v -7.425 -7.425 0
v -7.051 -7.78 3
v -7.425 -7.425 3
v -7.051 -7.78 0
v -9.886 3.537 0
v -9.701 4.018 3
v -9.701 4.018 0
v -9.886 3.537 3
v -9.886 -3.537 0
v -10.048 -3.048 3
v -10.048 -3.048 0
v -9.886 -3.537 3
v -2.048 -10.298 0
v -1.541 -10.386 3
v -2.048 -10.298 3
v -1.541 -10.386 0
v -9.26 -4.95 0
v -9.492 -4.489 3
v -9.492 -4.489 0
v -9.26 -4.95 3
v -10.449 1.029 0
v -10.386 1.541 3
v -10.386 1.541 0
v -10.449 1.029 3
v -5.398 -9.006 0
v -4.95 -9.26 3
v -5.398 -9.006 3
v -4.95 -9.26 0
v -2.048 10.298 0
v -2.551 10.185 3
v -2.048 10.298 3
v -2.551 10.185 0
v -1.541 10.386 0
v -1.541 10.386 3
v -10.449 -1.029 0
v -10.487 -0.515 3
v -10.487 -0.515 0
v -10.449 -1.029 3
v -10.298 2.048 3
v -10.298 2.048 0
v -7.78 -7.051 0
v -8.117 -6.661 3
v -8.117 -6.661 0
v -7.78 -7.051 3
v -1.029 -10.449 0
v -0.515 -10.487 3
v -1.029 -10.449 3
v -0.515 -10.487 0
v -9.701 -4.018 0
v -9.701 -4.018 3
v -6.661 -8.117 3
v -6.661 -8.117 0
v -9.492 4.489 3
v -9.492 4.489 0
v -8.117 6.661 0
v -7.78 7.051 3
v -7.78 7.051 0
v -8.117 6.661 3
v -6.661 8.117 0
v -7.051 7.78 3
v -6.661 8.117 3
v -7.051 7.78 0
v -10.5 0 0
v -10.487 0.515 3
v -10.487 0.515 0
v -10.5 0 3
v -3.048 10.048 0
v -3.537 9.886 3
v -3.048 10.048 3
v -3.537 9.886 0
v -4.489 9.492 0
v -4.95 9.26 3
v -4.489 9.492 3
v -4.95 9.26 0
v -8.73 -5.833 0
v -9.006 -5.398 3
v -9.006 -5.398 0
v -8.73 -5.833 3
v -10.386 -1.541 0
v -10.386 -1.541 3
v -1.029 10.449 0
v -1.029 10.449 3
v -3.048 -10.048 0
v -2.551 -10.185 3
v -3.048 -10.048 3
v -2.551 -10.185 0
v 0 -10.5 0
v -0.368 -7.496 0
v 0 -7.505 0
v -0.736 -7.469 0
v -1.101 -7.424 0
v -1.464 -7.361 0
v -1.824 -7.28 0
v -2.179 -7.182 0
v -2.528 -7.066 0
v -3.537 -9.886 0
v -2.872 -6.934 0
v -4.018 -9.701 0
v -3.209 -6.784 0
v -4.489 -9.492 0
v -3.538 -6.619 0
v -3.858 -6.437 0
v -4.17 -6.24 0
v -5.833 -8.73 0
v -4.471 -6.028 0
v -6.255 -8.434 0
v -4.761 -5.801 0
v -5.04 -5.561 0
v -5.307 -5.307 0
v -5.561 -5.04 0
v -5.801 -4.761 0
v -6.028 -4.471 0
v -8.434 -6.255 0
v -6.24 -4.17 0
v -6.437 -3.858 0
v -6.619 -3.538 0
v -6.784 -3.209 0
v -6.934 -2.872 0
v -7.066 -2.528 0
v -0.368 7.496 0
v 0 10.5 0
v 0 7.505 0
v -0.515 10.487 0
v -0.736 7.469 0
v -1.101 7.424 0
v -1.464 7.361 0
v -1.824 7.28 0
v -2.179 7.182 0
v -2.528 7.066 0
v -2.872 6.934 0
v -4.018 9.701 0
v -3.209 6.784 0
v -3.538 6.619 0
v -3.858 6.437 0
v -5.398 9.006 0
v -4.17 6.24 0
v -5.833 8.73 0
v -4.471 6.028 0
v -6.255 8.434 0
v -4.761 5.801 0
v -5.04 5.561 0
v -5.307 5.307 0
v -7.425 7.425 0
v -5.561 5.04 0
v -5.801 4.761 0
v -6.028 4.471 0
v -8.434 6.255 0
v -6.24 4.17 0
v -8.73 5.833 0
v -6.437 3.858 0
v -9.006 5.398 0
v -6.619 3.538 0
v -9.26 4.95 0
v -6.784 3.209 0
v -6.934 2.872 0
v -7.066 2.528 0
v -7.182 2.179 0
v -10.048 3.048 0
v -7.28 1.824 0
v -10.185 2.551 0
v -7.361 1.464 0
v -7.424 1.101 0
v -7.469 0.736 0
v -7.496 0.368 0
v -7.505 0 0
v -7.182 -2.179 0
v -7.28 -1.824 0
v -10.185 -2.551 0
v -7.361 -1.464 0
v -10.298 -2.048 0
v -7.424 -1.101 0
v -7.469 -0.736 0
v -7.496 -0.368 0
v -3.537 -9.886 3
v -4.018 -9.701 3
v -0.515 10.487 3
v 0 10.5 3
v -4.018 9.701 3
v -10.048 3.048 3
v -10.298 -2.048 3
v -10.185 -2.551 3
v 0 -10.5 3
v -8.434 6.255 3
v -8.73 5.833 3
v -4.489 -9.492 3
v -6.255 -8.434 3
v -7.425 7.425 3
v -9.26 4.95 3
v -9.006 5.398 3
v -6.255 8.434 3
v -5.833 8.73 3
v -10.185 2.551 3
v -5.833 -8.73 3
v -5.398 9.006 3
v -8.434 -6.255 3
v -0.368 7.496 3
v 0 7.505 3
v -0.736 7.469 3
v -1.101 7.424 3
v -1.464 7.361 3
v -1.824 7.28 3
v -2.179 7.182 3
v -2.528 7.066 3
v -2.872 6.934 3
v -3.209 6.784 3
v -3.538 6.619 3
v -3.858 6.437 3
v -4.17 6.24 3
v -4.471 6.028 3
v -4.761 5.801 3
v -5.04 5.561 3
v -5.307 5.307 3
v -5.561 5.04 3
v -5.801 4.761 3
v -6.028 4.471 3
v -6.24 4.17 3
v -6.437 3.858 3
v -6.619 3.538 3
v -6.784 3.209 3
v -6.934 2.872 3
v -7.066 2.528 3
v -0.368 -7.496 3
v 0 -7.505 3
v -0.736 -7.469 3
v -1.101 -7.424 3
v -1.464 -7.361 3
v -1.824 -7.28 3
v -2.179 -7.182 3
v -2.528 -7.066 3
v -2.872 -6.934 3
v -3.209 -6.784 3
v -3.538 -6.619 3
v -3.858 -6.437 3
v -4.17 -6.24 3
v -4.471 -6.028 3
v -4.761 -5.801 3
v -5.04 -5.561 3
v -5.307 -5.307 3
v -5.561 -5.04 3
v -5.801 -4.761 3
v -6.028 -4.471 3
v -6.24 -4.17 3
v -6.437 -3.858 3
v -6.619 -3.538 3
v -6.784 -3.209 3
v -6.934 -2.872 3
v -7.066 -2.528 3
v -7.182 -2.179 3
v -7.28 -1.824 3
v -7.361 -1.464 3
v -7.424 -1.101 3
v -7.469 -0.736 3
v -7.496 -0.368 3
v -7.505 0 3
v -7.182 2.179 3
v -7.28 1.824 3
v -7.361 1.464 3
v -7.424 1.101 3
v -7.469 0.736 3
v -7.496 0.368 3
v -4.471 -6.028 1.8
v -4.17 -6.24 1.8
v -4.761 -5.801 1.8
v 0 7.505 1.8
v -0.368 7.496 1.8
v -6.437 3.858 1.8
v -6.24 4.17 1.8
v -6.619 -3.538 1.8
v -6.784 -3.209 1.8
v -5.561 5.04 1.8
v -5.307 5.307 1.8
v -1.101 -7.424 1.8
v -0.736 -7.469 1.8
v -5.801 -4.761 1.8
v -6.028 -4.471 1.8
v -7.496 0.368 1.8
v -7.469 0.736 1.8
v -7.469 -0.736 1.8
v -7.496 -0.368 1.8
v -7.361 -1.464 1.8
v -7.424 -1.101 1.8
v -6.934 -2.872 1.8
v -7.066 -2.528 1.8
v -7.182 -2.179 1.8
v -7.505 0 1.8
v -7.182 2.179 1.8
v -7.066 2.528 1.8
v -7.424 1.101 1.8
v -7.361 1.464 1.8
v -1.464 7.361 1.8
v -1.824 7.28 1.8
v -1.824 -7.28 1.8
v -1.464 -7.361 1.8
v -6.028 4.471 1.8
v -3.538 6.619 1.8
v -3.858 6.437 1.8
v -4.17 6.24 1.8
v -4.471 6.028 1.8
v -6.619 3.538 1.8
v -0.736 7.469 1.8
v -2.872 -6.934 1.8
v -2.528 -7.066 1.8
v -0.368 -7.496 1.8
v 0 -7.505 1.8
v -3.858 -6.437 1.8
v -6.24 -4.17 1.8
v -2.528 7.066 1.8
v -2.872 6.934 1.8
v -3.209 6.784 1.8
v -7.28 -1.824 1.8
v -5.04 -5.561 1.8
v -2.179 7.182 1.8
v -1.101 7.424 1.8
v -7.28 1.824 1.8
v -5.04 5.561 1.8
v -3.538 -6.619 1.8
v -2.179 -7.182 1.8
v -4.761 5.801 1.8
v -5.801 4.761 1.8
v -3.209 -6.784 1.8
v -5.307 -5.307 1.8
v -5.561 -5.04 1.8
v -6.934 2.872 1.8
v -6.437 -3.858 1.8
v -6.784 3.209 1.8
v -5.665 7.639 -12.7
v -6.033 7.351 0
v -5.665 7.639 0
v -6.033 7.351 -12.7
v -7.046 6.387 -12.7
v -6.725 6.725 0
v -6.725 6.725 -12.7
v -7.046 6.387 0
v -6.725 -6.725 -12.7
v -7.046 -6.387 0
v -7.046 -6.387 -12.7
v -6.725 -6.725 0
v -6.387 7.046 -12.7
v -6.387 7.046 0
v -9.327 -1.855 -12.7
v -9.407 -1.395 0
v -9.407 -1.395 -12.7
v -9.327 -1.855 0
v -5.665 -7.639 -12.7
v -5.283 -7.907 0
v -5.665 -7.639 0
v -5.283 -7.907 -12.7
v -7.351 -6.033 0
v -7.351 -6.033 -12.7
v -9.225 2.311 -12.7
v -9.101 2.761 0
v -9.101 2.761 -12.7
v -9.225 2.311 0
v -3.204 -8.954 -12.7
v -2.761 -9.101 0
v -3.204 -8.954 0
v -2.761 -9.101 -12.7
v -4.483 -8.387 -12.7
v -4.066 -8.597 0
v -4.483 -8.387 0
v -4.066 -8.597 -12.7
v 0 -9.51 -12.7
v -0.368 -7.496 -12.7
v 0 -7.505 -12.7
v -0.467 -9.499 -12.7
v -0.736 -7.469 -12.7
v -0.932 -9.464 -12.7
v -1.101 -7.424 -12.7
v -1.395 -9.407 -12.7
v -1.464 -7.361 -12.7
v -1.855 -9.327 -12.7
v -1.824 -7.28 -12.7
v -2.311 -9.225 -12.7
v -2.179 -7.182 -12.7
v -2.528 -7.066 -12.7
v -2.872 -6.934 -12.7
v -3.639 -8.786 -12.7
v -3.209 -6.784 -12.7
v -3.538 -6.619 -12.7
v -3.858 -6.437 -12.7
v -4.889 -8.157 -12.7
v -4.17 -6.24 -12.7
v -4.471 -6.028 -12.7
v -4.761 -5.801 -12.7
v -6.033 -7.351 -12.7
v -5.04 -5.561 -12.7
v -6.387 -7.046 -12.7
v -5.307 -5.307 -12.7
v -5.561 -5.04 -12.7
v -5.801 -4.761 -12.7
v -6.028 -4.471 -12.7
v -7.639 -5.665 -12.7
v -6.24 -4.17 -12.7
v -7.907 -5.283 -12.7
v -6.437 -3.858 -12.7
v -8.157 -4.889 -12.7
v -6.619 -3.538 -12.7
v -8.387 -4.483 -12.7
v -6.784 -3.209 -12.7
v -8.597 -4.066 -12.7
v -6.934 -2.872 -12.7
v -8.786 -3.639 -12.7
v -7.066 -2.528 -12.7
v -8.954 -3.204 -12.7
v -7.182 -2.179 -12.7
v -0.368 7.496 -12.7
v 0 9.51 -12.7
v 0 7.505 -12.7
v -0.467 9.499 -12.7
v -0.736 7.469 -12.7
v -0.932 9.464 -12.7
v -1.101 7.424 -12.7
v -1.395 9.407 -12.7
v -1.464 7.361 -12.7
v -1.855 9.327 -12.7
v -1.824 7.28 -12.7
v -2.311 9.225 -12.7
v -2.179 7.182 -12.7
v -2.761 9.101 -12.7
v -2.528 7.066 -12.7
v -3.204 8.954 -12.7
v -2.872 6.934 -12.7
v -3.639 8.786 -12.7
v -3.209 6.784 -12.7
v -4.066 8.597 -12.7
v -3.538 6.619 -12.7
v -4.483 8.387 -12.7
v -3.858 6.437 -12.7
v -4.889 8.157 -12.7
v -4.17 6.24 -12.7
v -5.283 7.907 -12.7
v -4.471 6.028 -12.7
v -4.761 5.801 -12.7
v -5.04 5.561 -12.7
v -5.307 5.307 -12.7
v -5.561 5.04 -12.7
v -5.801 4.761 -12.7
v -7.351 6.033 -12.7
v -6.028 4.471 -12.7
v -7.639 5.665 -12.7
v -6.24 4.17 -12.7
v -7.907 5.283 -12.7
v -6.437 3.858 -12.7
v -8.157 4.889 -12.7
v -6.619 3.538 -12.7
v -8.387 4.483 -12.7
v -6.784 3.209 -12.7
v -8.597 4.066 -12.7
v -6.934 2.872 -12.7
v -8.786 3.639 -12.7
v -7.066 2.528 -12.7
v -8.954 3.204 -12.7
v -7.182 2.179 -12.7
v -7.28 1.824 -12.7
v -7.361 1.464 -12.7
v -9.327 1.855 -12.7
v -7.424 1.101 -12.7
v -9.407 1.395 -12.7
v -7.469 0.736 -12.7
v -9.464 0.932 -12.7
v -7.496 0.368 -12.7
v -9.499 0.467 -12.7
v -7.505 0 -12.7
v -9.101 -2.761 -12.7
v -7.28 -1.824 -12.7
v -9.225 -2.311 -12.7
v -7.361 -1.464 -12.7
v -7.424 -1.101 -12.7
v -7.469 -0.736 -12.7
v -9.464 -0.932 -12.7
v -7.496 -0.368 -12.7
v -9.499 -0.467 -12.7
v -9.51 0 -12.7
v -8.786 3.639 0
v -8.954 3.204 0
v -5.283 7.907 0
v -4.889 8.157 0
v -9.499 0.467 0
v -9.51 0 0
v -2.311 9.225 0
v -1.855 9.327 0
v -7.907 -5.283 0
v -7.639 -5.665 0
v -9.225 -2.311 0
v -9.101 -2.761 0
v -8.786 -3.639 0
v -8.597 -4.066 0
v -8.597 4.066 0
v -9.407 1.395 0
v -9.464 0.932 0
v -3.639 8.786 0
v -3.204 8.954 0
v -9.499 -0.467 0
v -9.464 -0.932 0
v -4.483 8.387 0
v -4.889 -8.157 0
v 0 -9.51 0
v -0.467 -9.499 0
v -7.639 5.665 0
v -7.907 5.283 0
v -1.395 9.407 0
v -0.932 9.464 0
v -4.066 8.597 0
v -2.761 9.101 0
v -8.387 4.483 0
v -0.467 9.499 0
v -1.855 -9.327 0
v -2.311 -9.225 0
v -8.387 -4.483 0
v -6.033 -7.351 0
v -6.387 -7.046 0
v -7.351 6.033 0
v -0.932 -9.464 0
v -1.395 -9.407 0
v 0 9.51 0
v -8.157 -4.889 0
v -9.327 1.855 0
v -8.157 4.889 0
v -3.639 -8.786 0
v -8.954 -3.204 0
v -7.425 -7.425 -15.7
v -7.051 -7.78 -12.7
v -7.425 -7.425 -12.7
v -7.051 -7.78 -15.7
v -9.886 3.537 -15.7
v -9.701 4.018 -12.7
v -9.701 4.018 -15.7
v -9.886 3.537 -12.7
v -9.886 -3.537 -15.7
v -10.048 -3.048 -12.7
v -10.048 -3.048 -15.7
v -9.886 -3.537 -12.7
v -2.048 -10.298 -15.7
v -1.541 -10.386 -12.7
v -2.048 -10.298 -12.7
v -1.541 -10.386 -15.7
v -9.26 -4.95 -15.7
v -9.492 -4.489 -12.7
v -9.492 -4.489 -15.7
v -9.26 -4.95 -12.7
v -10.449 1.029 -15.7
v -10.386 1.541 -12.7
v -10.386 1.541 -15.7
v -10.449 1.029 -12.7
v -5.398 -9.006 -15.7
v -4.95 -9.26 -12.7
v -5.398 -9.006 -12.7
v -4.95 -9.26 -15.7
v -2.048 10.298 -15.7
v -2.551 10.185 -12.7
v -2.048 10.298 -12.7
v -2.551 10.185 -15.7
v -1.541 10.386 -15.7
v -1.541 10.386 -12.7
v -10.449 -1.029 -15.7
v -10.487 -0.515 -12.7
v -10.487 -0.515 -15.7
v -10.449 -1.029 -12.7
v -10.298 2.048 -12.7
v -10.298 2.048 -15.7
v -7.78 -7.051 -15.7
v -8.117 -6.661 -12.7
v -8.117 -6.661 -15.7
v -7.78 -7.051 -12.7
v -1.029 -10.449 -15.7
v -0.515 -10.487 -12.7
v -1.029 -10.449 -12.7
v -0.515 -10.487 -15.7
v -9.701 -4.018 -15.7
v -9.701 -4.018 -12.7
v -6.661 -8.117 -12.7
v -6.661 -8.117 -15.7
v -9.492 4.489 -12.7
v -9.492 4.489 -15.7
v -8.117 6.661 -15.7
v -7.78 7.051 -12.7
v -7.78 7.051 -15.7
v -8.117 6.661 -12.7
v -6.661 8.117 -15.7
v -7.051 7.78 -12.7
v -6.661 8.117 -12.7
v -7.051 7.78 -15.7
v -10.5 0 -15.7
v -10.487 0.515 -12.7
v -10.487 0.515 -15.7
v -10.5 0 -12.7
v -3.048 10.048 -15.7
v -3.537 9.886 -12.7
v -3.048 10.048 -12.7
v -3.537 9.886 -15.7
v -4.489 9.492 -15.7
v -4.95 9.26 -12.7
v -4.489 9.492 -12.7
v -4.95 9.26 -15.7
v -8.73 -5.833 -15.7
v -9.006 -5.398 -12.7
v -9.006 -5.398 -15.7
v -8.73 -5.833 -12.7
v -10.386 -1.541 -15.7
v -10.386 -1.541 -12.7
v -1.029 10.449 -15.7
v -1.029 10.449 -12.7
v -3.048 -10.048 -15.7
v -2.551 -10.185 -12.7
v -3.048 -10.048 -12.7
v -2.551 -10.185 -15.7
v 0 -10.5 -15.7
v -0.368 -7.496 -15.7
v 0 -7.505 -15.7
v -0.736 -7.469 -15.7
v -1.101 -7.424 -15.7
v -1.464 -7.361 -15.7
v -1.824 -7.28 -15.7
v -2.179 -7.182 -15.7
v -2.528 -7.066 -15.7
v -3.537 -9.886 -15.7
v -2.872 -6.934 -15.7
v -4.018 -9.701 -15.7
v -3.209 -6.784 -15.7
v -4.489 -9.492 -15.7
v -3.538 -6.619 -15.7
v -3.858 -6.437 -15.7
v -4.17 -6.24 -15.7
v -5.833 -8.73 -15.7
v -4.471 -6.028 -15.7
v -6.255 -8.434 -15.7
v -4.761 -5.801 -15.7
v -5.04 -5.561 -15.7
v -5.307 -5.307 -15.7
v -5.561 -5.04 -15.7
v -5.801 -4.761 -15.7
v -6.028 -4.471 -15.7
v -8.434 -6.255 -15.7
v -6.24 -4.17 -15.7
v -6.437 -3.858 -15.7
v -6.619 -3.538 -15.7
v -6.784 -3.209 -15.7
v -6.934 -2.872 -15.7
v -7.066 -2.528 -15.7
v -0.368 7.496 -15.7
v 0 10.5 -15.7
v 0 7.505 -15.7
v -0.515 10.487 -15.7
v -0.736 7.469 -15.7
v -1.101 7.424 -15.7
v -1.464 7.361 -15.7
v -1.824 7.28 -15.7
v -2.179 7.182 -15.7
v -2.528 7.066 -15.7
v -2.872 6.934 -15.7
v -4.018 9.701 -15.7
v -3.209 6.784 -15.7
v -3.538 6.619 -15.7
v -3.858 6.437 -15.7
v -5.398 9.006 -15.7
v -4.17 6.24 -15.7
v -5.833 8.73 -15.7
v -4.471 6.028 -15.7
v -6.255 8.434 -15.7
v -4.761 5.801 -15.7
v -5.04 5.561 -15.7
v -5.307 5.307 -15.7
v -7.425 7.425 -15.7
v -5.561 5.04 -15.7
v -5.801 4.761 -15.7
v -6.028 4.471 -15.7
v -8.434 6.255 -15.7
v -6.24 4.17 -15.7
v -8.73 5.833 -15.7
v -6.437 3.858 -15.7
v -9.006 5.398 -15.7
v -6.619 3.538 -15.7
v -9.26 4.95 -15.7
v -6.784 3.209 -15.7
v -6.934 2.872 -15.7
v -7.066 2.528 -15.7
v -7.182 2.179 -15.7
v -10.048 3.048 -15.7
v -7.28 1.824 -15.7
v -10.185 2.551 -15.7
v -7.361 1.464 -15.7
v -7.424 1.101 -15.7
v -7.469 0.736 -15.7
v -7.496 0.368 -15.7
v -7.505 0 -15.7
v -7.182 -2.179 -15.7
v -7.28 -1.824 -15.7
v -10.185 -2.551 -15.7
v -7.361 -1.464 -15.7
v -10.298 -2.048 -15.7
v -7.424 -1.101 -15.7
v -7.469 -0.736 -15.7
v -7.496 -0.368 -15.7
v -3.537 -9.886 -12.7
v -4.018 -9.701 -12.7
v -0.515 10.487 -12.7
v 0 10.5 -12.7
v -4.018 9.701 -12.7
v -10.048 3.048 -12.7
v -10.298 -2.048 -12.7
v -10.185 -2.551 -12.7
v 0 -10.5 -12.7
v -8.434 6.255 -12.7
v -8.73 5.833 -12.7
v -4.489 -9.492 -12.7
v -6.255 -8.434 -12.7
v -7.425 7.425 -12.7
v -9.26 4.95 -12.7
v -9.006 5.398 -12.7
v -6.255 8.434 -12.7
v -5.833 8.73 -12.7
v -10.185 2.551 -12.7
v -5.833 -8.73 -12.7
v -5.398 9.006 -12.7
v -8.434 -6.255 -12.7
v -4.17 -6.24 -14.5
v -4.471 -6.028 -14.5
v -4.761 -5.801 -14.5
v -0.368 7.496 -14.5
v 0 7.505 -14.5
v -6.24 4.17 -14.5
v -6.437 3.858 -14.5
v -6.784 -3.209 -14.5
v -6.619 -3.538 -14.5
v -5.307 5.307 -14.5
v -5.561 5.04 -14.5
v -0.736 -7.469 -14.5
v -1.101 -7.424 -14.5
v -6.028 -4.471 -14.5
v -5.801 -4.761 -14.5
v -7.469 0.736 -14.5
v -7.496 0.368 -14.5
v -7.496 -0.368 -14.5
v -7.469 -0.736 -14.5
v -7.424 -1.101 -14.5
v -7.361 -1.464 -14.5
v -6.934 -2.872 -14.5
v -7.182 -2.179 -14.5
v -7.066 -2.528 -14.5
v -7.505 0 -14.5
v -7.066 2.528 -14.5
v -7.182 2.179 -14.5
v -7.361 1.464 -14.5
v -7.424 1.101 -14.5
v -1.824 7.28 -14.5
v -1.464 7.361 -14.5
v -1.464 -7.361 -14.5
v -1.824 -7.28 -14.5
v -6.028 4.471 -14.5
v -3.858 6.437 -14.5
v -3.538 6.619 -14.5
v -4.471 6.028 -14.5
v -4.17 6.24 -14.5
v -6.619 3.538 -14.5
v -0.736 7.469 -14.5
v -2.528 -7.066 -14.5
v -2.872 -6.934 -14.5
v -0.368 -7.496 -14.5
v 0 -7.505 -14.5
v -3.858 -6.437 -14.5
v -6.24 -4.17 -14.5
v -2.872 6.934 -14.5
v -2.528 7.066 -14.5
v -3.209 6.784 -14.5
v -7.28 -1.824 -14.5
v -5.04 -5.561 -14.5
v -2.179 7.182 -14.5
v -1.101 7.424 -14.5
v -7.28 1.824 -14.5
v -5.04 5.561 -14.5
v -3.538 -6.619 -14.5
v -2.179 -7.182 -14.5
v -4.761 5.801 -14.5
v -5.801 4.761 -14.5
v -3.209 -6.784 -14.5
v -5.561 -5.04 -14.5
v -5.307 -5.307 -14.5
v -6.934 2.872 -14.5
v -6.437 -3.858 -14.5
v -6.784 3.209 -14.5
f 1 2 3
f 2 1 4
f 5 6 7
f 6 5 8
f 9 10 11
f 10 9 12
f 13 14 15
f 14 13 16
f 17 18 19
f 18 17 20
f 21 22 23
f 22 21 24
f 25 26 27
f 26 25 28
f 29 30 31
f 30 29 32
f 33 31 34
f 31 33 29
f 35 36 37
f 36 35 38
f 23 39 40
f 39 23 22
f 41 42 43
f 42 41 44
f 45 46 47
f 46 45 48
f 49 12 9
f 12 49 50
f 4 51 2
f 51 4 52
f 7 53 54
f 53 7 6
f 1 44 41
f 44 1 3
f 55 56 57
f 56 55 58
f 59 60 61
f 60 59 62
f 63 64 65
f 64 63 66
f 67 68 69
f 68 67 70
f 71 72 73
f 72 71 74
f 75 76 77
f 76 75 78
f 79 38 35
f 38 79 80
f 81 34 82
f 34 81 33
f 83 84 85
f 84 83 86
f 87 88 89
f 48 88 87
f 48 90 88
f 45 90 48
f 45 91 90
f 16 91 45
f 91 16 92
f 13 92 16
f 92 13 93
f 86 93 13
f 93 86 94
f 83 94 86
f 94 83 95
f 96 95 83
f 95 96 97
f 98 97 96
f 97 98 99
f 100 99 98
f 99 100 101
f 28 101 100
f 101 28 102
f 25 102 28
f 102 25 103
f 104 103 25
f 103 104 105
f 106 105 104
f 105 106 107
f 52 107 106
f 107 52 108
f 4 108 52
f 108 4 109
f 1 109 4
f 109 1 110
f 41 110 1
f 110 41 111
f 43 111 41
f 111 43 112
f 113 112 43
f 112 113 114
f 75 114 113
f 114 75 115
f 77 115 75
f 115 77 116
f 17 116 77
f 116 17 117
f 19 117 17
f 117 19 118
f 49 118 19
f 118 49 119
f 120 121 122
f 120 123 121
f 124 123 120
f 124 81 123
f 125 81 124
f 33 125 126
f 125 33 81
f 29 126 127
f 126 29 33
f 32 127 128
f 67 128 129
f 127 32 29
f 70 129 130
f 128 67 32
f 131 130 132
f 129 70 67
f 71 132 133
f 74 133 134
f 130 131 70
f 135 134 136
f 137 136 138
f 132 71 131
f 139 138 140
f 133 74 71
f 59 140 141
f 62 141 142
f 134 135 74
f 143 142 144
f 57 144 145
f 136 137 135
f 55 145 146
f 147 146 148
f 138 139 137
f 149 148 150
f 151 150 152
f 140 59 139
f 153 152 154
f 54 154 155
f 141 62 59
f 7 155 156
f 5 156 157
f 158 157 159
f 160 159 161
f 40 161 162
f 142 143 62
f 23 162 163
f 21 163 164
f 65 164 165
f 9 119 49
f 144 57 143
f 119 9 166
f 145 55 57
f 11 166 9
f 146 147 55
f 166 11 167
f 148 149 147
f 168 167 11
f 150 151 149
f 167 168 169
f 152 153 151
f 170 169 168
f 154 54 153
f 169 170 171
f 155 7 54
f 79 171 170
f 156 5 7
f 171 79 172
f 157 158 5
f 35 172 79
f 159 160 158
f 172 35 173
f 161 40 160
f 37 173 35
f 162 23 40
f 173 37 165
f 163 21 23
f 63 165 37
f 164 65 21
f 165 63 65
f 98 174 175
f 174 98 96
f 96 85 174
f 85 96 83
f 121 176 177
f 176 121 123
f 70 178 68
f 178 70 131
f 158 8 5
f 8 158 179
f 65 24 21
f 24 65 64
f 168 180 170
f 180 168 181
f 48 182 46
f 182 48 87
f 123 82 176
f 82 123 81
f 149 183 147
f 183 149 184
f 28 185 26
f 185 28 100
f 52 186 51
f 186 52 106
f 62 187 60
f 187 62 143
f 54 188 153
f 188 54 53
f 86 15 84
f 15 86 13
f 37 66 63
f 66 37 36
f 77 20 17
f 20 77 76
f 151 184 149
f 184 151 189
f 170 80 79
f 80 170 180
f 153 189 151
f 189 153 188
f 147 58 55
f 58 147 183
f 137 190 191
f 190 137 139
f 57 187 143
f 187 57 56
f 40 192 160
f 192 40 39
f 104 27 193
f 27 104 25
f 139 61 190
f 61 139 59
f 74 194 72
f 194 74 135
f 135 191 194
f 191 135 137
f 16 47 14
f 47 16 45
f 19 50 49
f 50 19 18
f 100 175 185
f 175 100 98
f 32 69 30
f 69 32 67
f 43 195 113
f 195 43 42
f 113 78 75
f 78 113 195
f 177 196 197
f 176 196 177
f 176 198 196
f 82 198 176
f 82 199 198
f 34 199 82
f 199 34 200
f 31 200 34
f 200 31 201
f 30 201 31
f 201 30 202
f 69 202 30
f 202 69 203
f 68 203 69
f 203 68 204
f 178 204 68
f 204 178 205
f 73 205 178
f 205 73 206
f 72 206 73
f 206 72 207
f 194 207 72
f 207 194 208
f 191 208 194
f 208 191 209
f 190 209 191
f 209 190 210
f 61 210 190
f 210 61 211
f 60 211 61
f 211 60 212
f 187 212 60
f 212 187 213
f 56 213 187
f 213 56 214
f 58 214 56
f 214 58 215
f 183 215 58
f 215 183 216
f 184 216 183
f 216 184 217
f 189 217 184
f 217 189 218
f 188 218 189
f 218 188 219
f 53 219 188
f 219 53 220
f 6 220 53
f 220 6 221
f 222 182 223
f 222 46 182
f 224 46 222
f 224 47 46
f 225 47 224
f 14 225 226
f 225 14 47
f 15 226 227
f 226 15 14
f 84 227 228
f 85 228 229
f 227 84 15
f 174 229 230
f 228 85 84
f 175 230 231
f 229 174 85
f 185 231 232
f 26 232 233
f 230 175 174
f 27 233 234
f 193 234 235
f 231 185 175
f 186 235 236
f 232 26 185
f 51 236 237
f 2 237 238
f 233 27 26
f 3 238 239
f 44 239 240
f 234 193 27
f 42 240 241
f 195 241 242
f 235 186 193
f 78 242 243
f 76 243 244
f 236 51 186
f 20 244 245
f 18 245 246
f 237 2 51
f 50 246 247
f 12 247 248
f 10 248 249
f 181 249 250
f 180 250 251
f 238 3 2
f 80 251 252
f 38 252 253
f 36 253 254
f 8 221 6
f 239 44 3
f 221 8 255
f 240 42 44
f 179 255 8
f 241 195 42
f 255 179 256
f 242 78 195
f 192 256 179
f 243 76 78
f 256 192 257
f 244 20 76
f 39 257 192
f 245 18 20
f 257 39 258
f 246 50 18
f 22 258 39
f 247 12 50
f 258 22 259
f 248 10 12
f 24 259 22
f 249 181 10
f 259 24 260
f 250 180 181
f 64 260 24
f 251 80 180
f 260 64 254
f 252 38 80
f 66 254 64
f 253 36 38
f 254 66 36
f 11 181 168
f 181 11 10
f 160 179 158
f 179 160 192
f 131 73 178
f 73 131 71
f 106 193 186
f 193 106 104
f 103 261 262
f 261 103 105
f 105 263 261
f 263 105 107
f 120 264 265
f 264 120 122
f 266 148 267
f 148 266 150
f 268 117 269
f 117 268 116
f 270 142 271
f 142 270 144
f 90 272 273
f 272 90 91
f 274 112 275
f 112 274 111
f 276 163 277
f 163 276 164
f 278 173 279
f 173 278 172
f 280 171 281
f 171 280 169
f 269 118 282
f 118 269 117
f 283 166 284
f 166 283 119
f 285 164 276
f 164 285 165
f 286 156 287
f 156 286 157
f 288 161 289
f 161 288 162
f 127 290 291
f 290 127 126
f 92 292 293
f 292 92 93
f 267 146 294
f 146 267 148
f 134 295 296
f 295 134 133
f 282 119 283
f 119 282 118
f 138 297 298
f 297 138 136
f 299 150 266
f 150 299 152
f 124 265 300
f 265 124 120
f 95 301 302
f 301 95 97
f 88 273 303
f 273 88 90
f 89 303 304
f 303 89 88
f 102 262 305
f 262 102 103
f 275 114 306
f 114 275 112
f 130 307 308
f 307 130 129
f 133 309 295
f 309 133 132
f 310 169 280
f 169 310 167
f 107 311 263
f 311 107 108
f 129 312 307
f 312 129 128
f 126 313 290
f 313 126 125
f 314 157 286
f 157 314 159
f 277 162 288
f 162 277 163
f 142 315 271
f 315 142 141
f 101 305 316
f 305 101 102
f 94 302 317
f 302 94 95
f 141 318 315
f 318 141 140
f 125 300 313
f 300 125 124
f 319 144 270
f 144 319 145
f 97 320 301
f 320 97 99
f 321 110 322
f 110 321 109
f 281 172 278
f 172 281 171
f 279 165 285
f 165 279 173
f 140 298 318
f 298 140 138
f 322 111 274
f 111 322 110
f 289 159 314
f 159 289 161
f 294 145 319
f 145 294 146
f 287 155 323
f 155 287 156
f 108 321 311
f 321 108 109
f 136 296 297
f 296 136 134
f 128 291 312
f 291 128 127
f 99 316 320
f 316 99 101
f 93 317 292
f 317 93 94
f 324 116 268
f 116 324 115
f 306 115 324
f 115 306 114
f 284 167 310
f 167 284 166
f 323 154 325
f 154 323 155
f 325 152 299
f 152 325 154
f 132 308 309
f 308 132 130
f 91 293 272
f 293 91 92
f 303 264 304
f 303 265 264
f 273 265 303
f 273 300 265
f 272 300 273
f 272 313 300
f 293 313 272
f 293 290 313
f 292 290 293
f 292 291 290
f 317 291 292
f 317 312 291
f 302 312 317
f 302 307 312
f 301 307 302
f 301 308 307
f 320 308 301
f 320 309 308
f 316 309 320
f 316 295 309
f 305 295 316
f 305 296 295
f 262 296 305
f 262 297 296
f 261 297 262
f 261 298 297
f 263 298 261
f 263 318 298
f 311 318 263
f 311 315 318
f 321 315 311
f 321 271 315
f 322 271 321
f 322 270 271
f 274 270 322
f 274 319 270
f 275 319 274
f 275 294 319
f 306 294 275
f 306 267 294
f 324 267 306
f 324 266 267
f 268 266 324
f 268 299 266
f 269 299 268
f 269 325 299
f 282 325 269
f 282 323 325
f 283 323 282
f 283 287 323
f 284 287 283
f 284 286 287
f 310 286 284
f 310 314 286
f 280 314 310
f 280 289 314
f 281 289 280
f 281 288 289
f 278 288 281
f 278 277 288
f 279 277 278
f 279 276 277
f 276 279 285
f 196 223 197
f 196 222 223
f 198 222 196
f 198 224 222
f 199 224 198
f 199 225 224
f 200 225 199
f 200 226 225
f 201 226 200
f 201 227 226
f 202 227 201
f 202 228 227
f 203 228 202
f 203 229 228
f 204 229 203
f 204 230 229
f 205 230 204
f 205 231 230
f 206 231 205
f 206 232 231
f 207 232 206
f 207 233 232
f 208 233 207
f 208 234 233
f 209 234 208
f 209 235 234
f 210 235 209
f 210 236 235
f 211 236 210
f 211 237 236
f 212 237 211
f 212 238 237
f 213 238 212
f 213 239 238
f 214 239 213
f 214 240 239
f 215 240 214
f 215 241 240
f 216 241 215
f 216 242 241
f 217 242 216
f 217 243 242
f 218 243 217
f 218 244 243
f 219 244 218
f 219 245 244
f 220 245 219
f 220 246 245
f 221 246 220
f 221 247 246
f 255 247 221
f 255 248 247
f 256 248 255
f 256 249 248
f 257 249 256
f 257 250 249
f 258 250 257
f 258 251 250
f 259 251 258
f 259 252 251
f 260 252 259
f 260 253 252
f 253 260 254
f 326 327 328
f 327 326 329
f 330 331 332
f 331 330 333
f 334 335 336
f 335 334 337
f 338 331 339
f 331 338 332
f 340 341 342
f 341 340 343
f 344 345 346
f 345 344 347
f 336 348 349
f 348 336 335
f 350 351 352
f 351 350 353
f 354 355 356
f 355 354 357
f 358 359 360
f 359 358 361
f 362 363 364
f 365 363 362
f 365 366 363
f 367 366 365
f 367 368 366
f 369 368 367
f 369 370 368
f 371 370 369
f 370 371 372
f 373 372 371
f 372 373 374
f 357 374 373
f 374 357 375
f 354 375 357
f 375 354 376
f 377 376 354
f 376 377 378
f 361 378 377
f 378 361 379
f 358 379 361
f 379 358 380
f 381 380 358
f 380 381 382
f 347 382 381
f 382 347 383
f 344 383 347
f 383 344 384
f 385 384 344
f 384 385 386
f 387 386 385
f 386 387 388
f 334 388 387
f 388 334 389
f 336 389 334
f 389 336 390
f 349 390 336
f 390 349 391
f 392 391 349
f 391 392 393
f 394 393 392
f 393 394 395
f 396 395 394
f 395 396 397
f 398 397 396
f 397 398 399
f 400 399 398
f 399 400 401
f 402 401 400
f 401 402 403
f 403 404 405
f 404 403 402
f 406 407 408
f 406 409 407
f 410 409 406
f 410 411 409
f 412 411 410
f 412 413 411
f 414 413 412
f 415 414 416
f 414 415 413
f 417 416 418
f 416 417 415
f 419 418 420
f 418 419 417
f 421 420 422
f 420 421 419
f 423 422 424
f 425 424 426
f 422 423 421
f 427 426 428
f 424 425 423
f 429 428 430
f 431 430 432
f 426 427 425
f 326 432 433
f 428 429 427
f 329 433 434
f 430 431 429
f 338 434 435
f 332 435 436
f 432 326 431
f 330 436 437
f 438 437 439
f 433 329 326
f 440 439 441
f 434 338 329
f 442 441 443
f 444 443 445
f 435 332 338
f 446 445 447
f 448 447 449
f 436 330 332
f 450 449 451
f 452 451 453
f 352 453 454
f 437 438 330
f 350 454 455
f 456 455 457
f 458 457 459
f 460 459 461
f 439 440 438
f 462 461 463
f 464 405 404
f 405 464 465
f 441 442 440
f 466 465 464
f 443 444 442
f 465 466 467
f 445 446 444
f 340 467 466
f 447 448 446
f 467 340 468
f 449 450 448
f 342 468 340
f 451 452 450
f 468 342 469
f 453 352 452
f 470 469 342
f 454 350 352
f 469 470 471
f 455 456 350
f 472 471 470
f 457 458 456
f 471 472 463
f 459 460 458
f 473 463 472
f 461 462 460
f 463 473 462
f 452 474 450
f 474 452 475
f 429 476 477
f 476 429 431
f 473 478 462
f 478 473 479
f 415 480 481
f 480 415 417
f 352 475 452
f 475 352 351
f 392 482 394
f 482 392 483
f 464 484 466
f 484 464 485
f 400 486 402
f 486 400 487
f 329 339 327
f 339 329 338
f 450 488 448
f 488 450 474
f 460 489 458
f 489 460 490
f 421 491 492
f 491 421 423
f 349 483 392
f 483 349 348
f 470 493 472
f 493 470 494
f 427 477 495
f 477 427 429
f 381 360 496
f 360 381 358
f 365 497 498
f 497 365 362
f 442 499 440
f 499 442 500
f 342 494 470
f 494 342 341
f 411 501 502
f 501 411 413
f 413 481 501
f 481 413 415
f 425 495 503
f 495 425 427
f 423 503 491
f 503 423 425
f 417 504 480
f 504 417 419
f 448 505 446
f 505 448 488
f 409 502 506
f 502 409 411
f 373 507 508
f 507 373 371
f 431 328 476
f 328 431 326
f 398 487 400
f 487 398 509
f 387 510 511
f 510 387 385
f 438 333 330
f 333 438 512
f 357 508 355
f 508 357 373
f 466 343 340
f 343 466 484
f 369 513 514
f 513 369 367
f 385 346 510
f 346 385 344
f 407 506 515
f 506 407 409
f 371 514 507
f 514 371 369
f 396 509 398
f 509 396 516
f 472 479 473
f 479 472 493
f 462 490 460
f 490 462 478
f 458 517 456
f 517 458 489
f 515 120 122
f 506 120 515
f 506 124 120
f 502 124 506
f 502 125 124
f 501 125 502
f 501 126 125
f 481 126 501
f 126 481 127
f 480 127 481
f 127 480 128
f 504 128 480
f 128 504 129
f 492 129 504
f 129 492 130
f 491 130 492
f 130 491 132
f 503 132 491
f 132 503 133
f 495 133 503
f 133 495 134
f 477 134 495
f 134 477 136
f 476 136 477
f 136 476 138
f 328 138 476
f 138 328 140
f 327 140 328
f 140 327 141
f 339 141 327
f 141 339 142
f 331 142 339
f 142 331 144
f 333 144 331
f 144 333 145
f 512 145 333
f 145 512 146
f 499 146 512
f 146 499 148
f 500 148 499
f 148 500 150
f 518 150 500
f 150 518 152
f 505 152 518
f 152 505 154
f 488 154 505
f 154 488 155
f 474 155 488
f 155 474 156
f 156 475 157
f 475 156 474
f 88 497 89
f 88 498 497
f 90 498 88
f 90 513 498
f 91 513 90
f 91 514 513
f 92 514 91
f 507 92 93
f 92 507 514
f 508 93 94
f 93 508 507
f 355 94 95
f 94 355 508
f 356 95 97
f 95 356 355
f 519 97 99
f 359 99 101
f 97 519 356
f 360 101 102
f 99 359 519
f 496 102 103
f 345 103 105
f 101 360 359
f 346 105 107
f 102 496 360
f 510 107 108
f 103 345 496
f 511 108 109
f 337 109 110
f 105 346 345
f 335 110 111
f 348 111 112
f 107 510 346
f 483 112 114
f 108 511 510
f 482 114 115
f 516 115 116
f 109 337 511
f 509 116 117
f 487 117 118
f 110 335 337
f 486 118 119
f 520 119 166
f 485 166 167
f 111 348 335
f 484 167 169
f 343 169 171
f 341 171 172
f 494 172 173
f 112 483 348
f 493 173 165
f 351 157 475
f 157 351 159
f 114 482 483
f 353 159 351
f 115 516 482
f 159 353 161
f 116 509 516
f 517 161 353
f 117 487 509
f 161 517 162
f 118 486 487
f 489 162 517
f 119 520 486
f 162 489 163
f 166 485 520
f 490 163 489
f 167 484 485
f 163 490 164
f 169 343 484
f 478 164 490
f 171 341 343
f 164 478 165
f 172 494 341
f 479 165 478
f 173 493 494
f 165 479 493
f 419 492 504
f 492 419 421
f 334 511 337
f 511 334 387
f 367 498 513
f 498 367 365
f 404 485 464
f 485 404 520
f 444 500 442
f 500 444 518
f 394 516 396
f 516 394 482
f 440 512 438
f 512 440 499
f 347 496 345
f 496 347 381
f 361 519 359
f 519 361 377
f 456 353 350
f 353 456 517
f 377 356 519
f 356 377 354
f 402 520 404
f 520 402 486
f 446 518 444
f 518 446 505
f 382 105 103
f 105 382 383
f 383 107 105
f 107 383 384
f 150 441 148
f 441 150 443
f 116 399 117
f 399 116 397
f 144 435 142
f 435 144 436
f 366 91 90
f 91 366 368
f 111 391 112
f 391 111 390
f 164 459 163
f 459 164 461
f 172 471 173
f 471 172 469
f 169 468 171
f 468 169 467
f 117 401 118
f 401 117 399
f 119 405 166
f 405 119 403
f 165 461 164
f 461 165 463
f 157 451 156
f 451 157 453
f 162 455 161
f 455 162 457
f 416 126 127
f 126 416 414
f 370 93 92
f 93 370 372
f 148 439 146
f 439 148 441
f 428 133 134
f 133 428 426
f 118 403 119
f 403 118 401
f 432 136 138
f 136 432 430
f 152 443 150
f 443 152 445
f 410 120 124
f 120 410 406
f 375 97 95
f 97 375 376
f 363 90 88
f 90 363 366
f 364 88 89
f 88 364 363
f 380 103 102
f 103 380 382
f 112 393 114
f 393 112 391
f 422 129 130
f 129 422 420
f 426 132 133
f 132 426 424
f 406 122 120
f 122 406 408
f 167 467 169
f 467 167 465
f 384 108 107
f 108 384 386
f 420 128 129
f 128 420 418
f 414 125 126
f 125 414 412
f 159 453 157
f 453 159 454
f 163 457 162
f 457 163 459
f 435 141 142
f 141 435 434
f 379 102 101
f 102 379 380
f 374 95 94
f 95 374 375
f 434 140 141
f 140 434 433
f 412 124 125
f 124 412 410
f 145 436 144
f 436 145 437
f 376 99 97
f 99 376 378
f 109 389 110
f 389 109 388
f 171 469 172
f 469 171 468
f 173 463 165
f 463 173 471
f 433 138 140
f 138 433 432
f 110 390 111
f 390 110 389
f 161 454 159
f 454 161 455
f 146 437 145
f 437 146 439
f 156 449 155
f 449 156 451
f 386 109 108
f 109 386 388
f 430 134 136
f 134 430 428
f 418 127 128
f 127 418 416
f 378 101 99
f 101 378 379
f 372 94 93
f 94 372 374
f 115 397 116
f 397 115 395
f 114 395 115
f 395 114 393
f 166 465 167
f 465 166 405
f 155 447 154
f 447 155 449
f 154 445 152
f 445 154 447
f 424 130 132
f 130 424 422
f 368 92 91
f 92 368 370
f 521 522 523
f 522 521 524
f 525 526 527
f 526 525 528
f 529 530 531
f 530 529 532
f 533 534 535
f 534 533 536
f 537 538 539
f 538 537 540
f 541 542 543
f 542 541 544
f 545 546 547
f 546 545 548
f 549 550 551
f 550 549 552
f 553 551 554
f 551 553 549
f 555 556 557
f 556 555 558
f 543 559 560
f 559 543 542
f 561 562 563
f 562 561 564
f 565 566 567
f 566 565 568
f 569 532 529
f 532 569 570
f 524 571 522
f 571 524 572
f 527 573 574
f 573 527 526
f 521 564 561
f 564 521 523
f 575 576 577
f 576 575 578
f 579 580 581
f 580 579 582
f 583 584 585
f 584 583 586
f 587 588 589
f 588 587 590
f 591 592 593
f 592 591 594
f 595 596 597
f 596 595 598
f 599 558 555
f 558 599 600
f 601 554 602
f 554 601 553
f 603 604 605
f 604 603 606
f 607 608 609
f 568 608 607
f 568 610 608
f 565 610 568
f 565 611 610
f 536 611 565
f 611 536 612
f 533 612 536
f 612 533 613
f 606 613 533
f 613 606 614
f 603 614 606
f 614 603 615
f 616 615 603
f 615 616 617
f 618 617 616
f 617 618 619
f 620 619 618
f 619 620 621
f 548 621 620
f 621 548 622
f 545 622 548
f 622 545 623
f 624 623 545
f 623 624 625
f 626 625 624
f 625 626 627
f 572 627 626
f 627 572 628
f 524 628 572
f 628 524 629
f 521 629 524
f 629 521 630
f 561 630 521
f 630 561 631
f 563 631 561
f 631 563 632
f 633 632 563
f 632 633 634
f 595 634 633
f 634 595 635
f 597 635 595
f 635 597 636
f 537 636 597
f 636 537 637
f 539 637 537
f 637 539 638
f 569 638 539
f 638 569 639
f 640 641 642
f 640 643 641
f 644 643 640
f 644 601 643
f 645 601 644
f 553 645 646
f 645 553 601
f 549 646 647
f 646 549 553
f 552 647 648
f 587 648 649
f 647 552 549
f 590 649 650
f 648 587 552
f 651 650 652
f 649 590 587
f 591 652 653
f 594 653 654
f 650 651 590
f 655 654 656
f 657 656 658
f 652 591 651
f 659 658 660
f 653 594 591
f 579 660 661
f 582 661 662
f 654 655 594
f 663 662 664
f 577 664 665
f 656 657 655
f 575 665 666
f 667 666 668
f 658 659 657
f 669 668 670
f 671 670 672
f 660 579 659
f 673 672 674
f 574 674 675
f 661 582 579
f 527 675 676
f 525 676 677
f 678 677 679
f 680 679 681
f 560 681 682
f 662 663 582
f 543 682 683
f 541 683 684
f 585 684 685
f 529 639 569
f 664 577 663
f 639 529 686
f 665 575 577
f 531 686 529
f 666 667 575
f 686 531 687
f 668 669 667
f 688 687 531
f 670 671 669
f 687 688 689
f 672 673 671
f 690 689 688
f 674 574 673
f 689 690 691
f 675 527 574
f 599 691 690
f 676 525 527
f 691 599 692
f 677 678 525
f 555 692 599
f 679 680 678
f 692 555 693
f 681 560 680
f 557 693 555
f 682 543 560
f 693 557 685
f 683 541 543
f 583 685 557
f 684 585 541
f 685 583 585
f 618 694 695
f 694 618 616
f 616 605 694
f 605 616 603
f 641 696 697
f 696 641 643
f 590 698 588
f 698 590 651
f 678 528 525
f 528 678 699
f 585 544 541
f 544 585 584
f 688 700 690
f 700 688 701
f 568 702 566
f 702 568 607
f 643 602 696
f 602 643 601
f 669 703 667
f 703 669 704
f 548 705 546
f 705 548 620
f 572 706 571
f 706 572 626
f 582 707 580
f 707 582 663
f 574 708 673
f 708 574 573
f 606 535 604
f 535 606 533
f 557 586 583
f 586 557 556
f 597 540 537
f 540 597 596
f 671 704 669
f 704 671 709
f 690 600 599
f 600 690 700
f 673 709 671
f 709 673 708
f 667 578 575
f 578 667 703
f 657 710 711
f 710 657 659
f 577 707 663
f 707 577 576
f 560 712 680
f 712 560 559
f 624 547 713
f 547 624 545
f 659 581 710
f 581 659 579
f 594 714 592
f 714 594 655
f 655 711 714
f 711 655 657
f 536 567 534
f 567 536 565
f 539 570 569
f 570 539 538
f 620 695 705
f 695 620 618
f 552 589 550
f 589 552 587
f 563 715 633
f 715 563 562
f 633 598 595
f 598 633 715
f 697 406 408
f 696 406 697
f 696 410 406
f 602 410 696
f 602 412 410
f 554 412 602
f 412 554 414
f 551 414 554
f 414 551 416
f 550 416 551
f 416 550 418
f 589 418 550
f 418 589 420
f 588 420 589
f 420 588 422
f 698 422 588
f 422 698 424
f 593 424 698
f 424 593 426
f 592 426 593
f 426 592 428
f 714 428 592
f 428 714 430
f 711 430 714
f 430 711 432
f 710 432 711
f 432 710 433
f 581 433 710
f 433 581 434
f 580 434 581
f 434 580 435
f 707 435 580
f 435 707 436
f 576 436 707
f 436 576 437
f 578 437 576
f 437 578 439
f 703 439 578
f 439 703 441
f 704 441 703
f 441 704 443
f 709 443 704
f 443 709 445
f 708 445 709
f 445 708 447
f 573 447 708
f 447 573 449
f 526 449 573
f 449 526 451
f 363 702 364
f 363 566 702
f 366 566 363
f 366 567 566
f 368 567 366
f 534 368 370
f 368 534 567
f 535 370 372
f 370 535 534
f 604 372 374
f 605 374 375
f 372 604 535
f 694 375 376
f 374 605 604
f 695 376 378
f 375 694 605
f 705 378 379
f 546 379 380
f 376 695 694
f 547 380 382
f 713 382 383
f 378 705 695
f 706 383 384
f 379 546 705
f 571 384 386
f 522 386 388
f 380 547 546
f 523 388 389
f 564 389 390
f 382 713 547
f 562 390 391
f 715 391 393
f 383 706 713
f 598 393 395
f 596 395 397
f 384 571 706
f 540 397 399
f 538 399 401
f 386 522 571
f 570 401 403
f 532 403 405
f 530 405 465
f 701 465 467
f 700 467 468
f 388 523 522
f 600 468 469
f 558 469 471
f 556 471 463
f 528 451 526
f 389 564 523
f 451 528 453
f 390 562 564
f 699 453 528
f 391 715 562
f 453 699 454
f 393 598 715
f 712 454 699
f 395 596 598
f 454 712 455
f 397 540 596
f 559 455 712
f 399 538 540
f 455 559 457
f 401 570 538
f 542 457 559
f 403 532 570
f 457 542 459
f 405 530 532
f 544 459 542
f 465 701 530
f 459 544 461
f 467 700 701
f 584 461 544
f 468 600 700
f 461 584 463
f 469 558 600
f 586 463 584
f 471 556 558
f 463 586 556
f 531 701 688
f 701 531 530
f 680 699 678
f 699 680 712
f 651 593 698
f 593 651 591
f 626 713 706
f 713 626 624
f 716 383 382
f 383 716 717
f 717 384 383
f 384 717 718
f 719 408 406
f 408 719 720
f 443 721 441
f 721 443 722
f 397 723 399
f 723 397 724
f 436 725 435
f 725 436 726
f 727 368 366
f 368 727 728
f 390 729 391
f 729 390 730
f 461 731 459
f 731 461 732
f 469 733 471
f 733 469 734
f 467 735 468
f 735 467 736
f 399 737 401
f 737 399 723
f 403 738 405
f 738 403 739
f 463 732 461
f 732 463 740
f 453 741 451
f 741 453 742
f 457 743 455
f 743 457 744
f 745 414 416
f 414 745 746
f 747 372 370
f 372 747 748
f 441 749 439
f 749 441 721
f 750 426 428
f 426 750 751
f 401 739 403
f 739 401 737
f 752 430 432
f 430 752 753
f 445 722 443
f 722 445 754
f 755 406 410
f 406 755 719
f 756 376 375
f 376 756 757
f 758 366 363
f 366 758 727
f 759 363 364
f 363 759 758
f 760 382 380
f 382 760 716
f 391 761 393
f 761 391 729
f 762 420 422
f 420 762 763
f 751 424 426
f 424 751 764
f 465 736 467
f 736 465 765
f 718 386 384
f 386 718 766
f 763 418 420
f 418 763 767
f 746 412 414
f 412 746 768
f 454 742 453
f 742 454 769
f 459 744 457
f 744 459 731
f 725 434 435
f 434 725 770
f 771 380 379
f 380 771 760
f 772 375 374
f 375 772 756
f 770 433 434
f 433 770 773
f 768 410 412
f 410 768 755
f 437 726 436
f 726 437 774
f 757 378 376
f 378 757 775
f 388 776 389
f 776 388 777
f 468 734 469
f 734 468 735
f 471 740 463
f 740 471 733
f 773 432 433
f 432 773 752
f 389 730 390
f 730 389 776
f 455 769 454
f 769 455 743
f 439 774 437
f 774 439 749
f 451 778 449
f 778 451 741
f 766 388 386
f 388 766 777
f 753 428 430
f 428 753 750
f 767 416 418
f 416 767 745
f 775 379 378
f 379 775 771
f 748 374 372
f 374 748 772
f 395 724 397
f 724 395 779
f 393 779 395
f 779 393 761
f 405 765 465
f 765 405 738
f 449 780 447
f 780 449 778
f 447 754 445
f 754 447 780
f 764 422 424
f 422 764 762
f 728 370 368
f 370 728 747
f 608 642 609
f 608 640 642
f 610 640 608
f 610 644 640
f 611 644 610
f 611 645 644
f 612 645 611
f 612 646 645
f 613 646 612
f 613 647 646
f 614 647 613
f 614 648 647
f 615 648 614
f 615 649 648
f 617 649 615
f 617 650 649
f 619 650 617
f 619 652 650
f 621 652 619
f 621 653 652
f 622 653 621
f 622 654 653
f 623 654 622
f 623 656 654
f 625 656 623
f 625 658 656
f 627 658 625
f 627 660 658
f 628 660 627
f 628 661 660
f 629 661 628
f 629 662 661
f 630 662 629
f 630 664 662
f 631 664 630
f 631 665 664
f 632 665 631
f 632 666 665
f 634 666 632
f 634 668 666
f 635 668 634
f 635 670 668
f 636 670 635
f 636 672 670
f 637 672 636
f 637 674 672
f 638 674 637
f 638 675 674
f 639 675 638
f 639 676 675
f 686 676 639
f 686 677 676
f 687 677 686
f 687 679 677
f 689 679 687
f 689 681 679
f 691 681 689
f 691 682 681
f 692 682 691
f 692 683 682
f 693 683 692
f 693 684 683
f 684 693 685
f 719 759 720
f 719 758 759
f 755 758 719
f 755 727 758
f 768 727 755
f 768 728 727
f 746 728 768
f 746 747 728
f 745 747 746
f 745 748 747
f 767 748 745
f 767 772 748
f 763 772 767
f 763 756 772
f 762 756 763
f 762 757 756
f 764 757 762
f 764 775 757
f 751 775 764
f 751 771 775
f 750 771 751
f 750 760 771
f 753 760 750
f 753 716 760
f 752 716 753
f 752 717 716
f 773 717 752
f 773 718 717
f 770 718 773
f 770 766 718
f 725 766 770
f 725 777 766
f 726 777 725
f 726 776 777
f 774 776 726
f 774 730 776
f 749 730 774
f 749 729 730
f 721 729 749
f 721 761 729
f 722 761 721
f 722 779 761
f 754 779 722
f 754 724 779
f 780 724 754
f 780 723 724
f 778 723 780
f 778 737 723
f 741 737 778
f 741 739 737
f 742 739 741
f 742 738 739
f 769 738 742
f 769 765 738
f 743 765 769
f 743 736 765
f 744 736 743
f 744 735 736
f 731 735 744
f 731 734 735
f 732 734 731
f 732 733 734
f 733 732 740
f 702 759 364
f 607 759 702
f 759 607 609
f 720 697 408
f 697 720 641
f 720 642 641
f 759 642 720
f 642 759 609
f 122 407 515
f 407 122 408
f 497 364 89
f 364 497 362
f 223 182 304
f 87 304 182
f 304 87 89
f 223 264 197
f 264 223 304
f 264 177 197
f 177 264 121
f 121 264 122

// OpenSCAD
/* [Tunnel] */
innerDia = 15.01;
// The diameter of your hole
outerDia = 19.01;
// Depth of your hole. Flanges are extra
wallDepth = 12.7;

/* [Top Flange] */
// Make equal to outerDia to remove the flange
topFlangeDia = 21;
// Thickness of the outer flange that grips the wall
topFlangeH = 3;
// Thickness of the flap that keeps stuff out of the grommet
topFlapDep = 1.2;
// Set equal to innerDia to remove flap
topFlapHoleDia = 0;

/* [Bottom Flange] */
// Set to -1 to use the same value as topFlangeDia
bottomFlangeDiameter = -1;
// Set to -1 to use the same value as topFlangeH
bottomFlangeHeight = -1;
// Set to -1 to use the same value as topFlapDep
bottomFlapDepth = -1;
// Set to -1 to use the same value as topFlapHoleDia
bottomFlapHoleDiameter = -1;

/* [Print] */
// Print in one piece, or split along length or width for support-less printing
cut = 1; // [0:None, 1:hotdog, 2:hamburger]


module null() {
    // just make customizer stop parsing variables
}
$fn=128 + 0;
e = .01 + 0;

bottomFlangeDia = (bottomFlangeDiameter < 0) ? topFlangeDia : bottomFlangeDiameter;
bottomFlangeH = (bottomFlangeHeight < 0) ? topFlangeH : bottomFlangeHeight;
bottomFlapHoleDia = (bottomFlapHoleDiameter < 0) ? topFlapHoleDia : bottomFlapHoleDiameter;
bottomFlapDep = (bottomFlapDepth < 0) ? topFlapDep : bottomFlapDepth;

module topFlange() {
    translate([0, 0, topFlangeH/2]) {
        difference() {
            cylinder(d=topFlangeDia, h=topFlangeH, center=true);
            cylinder(d=innerDia, h=topFlangeH+2*e, center=true);
        }
        
        //flap
        translate([0, 0, (topFlangeH-topFlapDep)/2]) difference() {
            cylinder(d=innerDia+e, h=topFlapDep, center=true);
            cylinder(d=topFlapHoleDia, topFlapDep*2, center=true);
        }
    }
        
}

module bottomFlange() {
    translate([0, 0, -wallDepth-bottomFlangeH/2]) {
        difference() {
            cylinder(d=bottomFlangeDia, h=bottomFlangeH, center=true);
            cylinder(d=innerDia, h=bottomFlangeH+2*e, center=true);
        }
        
        //flap
        translate([0, 0, -(topFlangeH-topFlapDep)/2]) difference() {
            cylinder(d=innerDia+e, h=topFlapDep, center=true);
            cylinder(d=topFlapHoleDia, topFlapDep*2, center=true);
        }
    }
}

module tunnel() {
    height = wallDepth+topFlangeH+bottomFlangeH;
    
    translate([0, 0, -wallDepth/2]) difference() {
        cylinder(d=outerDia+e, h=wallDepth, center=true);
        cylinder(d=innerDia, h=height+2*e, center=true);
    }
}

module grommet() {
    topFlange();
    tunnel();
    bottomFlange();
}

module halfGrommet1() {
    w=topFlangeDia+bottomFlangeDia;
    height = wallDepth+topFlangeH+bottomFlangeH;
    
    difference() {
        grommet();
        translate([0, -w/2, -height*2]) cube(size=[w, w, height*4]);
    }
}

module halfGrommet2() {
    w=topFlangeDia+bottomFlangeDia;
    height = wallDepth+topFlangeH+bottomFlangeH;
    
    difference() {
        grommet();
        translate([0, 0, -(height+wallDepth)/2]) cube(size=[w, w, height], center=true);
    }
    
}

if (cut == 0) {
    grommet();
} else if (cut == 1) {
    halfGrommet1();
} else if (cut == 2) {
    halfGrommet2();
}
